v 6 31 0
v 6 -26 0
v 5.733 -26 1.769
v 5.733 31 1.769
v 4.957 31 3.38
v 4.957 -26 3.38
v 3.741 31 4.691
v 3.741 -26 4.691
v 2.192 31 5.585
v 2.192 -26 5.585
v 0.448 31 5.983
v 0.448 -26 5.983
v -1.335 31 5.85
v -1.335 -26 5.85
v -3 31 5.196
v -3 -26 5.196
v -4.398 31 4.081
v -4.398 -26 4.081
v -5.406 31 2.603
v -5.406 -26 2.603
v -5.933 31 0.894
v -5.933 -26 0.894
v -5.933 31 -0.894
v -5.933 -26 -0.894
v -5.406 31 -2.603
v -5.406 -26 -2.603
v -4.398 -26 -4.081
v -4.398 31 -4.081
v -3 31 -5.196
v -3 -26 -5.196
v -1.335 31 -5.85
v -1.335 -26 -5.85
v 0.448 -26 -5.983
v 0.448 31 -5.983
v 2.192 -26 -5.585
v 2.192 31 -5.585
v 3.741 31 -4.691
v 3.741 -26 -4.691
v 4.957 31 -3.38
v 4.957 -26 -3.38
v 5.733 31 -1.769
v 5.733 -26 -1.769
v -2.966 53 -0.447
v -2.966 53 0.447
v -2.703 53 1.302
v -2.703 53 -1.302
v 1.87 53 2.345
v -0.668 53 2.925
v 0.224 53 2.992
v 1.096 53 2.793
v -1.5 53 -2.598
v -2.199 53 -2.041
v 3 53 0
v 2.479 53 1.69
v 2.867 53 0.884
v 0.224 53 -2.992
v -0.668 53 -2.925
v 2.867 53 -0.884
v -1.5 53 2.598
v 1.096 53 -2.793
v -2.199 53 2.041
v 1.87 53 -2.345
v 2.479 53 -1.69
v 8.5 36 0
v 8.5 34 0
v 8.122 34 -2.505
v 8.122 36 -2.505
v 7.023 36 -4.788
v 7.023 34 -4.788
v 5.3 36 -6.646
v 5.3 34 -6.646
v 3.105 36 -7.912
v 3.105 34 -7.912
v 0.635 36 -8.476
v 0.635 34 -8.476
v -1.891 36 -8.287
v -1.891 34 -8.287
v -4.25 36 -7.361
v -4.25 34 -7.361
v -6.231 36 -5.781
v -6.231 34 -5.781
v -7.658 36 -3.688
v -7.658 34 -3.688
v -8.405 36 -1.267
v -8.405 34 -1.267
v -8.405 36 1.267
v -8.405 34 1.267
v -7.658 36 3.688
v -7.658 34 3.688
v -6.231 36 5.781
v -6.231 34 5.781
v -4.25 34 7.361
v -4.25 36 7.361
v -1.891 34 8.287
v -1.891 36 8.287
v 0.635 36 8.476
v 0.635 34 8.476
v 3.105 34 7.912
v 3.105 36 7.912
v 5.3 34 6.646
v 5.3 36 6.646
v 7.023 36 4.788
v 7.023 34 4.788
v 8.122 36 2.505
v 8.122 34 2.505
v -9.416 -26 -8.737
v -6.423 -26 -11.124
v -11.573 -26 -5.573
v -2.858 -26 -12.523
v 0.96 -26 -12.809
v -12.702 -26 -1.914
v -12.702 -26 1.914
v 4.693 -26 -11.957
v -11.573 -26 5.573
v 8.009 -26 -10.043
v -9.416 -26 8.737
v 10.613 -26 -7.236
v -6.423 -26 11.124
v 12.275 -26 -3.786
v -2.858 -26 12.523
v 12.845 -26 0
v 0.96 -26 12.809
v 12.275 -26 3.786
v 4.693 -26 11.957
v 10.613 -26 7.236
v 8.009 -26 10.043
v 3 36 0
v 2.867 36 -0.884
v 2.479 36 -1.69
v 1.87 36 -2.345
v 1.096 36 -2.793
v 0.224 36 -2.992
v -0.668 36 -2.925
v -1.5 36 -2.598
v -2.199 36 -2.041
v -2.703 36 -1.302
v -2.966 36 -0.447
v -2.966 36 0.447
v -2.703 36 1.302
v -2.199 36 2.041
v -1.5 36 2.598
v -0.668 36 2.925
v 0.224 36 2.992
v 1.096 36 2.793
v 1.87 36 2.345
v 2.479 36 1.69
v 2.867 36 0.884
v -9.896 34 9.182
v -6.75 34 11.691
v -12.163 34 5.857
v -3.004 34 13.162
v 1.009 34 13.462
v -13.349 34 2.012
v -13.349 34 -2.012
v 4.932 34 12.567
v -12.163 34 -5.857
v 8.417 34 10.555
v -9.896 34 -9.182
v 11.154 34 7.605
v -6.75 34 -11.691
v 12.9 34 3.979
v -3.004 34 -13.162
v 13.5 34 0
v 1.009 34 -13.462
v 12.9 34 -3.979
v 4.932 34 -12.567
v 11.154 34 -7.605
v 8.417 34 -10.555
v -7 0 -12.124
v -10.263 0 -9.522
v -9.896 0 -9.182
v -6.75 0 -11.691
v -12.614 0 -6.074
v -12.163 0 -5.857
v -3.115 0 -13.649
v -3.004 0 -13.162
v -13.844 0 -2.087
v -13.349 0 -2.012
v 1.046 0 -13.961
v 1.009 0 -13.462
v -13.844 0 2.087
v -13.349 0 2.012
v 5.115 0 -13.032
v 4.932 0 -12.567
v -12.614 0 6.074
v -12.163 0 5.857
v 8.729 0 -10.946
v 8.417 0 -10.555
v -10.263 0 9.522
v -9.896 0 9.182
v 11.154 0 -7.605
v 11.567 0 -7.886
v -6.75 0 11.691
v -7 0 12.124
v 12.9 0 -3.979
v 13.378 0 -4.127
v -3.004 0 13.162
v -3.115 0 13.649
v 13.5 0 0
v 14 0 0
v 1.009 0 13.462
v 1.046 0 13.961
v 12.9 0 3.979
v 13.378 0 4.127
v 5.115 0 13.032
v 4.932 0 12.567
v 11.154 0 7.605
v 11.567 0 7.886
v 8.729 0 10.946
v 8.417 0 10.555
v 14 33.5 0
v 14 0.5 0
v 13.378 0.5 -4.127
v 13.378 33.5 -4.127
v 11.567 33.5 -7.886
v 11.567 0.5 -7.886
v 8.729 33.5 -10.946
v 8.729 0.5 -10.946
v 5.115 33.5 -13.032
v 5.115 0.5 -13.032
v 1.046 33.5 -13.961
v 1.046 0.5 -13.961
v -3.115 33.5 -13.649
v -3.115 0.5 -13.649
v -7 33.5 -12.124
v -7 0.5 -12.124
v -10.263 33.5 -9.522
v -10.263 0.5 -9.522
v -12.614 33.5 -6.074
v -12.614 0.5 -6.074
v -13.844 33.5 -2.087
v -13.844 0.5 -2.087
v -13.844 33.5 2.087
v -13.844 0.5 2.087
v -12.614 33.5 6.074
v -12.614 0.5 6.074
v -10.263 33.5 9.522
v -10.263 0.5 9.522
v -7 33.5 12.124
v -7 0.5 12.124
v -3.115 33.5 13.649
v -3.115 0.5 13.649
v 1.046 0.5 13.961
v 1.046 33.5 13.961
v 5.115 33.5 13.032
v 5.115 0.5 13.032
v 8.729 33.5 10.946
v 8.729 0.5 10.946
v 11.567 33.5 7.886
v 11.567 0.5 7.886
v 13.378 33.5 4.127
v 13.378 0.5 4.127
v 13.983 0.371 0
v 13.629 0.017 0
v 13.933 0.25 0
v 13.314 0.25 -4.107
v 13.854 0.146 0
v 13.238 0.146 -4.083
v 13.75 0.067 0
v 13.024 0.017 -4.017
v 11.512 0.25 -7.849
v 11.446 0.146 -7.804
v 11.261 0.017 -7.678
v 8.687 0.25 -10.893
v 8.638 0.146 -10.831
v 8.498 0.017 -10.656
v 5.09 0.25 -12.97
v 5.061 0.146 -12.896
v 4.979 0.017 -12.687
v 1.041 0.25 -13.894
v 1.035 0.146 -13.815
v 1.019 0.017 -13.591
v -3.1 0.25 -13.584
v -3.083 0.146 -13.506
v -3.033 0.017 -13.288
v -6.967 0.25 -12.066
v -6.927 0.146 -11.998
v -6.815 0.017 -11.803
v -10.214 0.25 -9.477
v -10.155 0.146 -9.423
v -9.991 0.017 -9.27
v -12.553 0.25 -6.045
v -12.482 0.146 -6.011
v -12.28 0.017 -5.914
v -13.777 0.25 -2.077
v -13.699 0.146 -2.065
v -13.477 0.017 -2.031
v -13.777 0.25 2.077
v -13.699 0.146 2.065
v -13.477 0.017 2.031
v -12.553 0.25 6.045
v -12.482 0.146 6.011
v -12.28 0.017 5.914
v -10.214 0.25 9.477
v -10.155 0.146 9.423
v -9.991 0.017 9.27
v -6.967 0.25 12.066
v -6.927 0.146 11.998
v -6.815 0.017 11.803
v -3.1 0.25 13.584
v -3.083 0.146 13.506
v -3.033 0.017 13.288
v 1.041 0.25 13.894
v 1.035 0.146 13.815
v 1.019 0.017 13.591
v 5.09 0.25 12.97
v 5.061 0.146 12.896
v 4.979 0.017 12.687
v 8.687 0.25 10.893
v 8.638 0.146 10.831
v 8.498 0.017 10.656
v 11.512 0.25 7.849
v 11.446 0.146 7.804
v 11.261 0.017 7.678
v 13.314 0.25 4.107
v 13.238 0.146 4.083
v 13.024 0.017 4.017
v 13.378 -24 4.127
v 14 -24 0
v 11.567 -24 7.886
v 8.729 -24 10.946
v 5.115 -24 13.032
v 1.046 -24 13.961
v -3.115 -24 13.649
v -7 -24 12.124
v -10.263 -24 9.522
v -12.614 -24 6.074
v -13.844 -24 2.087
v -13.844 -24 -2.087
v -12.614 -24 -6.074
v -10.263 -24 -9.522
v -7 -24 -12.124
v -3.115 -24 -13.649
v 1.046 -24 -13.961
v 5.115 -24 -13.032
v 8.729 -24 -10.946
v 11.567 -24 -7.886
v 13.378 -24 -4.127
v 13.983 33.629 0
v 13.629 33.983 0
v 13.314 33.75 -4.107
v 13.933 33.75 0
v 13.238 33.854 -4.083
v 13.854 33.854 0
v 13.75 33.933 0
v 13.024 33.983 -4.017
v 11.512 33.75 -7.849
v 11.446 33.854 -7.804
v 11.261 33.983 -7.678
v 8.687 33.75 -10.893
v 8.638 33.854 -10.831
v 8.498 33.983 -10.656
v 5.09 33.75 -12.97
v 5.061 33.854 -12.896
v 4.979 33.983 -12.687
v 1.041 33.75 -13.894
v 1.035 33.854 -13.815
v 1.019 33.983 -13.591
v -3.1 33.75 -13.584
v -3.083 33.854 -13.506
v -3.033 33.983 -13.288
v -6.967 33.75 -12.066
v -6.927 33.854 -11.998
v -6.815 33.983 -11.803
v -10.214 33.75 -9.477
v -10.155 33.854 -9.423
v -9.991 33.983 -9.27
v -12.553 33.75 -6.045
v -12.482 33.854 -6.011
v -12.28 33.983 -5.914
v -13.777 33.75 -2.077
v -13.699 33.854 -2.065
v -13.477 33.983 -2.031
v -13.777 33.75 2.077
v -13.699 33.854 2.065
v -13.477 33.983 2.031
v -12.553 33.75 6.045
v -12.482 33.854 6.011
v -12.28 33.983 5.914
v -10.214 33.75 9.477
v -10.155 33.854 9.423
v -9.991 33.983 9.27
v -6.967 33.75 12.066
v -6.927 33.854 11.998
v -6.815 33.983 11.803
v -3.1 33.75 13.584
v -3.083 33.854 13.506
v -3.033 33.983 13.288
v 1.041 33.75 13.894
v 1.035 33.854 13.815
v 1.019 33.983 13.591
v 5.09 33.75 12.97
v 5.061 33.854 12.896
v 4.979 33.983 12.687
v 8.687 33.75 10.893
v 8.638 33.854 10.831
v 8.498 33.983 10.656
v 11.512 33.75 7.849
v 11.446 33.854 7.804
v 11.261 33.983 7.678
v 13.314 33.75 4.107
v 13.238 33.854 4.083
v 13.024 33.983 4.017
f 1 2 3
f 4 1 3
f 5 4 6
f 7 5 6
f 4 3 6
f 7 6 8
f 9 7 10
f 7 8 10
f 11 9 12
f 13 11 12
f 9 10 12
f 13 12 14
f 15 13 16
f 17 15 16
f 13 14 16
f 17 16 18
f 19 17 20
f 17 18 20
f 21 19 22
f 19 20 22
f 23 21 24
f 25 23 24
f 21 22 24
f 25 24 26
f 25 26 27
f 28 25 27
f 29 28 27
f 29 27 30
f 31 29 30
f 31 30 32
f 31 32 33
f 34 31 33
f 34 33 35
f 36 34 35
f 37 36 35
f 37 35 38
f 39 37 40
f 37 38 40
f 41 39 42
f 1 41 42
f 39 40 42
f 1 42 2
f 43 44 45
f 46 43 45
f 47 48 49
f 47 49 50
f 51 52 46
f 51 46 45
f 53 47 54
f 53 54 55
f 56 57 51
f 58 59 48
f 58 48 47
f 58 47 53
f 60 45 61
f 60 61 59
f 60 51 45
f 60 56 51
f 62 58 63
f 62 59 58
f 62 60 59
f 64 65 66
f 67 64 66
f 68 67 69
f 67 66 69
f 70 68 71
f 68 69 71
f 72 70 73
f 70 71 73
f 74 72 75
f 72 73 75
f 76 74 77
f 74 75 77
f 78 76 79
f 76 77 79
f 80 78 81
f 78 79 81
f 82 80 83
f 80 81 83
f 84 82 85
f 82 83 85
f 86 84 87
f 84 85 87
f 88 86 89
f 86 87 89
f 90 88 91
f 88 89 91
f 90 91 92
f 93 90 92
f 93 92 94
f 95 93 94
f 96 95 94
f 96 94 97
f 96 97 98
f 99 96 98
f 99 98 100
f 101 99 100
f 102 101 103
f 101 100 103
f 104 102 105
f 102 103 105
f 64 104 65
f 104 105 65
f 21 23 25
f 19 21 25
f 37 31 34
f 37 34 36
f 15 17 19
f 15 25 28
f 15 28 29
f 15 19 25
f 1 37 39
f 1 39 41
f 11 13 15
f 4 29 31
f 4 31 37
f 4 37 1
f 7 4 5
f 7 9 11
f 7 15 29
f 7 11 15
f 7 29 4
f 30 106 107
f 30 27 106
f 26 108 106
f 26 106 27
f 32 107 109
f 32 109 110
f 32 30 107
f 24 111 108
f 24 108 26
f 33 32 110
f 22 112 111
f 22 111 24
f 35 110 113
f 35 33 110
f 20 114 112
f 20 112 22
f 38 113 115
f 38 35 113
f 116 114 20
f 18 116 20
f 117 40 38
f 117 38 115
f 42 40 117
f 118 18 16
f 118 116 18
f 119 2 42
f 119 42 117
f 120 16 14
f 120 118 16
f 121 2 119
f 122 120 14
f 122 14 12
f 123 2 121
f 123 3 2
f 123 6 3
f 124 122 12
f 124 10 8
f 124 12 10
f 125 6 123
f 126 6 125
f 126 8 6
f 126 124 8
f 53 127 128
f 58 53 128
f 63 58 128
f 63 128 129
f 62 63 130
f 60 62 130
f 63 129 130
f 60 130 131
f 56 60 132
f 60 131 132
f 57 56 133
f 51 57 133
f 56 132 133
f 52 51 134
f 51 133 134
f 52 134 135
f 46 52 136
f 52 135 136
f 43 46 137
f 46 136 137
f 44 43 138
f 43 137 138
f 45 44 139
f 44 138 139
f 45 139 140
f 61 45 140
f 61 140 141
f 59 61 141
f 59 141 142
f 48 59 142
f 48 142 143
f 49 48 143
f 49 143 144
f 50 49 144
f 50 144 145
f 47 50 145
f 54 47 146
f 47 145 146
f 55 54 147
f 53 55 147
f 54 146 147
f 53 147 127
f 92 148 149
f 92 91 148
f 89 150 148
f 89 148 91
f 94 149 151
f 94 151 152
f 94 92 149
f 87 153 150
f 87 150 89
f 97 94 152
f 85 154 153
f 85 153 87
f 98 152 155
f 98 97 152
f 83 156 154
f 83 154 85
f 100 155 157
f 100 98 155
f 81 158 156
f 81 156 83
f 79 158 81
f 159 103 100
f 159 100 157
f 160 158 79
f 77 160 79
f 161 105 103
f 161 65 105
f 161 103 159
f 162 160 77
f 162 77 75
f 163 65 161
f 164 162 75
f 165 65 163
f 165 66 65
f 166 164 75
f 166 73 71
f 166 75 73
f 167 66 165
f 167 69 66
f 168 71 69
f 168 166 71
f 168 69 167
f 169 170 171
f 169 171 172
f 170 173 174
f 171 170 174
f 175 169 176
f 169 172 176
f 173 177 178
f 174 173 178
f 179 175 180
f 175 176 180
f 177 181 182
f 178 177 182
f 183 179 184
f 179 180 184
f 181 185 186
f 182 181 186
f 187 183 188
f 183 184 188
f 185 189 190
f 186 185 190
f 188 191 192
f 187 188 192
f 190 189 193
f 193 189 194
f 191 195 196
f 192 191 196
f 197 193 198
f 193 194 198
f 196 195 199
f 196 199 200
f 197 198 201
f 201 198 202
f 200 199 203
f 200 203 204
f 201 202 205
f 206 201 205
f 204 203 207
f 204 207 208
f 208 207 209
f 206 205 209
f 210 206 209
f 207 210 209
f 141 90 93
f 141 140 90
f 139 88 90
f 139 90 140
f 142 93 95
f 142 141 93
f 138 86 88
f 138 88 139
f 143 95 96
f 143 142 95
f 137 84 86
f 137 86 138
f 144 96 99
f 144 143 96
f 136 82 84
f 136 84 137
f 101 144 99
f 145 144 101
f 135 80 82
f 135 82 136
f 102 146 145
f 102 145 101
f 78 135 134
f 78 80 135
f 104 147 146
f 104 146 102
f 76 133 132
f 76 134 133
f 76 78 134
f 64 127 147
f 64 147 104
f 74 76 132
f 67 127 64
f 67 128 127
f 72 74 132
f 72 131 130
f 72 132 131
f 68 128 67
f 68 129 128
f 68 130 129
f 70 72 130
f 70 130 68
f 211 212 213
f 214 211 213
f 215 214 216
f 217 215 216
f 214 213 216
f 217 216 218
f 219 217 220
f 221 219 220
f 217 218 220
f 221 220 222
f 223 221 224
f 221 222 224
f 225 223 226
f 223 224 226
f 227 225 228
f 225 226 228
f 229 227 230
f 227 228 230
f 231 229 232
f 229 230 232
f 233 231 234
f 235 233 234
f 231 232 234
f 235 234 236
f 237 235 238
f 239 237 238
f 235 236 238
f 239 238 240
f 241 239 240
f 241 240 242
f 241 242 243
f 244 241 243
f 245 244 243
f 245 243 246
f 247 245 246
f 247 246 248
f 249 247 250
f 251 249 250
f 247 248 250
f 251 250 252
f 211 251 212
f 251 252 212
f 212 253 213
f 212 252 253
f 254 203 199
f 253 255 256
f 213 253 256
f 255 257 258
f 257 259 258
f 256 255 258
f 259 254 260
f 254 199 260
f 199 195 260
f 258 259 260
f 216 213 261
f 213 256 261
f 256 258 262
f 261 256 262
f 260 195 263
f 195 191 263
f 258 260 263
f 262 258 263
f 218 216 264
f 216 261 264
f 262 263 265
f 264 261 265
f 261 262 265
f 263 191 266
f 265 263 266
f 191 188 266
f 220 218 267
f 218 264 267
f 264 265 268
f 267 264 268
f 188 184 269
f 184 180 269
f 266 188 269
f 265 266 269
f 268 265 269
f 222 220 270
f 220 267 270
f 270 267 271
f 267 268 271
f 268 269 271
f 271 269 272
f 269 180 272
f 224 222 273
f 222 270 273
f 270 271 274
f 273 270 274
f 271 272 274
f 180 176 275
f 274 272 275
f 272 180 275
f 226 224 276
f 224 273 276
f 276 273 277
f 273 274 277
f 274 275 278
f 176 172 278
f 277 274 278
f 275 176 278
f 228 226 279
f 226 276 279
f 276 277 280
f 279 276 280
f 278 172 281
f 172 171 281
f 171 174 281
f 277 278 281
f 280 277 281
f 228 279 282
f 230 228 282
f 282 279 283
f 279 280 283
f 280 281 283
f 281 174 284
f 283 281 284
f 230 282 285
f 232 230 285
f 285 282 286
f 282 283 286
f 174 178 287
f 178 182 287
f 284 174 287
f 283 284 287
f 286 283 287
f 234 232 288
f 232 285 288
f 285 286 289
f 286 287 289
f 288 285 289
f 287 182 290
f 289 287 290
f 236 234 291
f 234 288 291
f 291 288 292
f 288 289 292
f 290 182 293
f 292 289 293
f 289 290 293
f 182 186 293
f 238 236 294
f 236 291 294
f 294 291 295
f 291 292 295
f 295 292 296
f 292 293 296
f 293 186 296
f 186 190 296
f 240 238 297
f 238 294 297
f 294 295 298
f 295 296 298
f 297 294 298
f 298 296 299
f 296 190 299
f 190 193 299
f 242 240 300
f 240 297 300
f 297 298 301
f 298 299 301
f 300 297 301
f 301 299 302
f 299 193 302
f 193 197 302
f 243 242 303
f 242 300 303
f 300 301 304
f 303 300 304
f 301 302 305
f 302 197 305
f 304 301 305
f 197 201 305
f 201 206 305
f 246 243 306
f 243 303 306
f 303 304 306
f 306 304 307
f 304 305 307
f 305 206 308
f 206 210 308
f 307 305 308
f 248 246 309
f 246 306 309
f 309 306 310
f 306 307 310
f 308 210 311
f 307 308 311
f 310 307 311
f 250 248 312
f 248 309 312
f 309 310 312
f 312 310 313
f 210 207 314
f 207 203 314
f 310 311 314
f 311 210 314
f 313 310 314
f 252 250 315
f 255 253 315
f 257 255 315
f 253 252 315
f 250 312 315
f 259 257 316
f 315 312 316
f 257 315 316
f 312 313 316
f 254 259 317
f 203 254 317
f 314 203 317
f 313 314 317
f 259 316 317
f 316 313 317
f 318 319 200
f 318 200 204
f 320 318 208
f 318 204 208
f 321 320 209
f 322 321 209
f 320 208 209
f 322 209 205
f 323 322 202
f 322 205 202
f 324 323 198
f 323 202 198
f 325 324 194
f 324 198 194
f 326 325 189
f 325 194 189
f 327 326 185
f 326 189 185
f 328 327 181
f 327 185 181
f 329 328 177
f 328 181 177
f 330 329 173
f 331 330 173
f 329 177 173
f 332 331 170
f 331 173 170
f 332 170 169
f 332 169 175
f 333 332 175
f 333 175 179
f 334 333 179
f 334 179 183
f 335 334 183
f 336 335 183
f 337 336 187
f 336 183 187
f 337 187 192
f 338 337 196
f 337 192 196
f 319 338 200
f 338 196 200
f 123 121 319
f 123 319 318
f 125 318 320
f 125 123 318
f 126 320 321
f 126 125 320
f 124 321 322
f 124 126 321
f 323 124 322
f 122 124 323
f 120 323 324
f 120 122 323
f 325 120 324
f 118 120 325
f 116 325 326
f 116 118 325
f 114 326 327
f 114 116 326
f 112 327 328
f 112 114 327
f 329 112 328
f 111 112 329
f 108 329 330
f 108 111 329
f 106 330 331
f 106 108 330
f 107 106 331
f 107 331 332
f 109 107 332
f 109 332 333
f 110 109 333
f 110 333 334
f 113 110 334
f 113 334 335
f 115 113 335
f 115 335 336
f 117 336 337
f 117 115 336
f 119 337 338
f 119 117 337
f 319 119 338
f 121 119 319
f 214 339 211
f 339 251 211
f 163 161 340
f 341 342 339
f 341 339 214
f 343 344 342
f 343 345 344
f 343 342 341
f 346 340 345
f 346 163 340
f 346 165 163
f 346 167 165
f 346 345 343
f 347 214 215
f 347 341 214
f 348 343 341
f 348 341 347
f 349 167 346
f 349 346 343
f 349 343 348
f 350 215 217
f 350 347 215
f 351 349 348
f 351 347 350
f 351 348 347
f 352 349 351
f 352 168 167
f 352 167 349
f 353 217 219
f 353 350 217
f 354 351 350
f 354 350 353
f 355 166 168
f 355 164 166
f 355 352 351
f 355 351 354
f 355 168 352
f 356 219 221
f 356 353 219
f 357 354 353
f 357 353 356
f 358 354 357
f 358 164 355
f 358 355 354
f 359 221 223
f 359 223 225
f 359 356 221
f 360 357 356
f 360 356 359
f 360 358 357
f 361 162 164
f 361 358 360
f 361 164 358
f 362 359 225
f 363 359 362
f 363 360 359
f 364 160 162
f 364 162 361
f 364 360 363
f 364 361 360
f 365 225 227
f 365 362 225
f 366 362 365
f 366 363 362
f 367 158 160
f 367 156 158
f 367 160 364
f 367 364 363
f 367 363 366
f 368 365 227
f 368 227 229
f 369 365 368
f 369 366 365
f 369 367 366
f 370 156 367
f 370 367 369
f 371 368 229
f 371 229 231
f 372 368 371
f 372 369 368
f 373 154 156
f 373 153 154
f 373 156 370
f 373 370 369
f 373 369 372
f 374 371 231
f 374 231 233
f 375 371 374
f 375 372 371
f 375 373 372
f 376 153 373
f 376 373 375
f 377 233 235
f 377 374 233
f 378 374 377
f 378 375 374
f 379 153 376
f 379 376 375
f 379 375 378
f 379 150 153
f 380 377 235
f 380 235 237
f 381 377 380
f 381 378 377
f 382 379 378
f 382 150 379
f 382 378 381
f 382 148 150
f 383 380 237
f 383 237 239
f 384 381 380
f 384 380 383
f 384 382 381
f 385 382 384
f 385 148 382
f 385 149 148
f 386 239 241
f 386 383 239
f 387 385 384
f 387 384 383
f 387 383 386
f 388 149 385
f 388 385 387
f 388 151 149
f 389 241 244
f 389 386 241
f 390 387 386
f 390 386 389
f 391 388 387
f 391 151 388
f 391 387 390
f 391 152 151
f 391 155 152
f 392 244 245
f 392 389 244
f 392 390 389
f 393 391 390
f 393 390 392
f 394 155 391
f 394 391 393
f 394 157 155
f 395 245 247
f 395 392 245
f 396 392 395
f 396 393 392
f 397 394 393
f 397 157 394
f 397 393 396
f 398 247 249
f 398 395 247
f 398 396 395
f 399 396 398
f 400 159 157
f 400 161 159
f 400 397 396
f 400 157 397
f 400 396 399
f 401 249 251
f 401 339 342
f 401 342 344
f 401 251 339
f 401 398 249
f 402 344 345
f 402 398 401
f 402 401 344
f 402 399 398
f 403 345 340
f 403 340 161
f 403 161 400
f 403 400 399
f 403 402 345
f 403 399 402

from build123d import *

# Parameters (mm, degrees)
SKETCH1_R           = 14
BOSS_EXTRUDE1_DEPTH = 34
SKETCH2_R           = 8.5
BOSS_EXTRUDE2_DEPTH = 2
SKETCH3_R           = 3
BOSS_EXTRUDE3_DEPTH = 17
FILLET1_R           = 0.5
SKETCH5_R           = 14
BOSS_EXTRUDE4_DEPTH = 26
CHAMFER1_SIZE       = 2
CHAMFER1_SIZE2      = 1.154700538
SKETCH6_R           = 6
CUT_EXTRUDE1_DEPTH  = 57


with BuildPart() as part:
    # Sketch1 → Boss-Extrude1 (new body)
    with BuildSketch(Plane(origin=(0, 0, 0), x_dir=(1, 0, 0), z_dir=(0, 1, 0))):
        Circle(SKETCH1_R)
    extrude(amount=BOSS_EXTRUDE1_DEPTH)

    # Sketch2 → Boss-Extrude2 (add)
    with BuildSketch(Plane(origin=(0, 34, 0), x_dir=(1, 0, 0), z_dir=(0, 1, 0))):
        Circle(SKETCH2_R)
    extrude(amount=BOSS_EXTRUDE2_DEPTH)

    # Sketch3 → Boss-Extrude3 (add)
    with BuildSketch(Plane(origin=(0, 36, 0), x_dir=(1, 0, 0), z_dir=(0, 1, 0))):
        Circle(SKETCH3_R)
    extrude(amount=BOSS_EXTRUDE3_DEPTH)

    # Fillet1
    fillet1_edges = [part.edges().sort_by_distance(p)[0] for p in [
        (-14, 0, 0),
        (-14, 34, 0),
    ]]
    fillet(fillet1_edges, radius=FILLET1_R)

    # Sketch5 → Boss-Extrude4 (add)
    with BuildSketch(Plane.XZ):
        Circle(SKETCH5_R)
    extrude(amount=BOSS_EXTRUDE4_DEPTH)

    # Chamfer1
    chamfer1_edges = [part.edges().sort_by_distance(p)[0] for p in [
        (-14, -26, 0),
    ]]
    chamfer1_side = [part.faces().sort_by_distance(p)[0] for p in [
        (-14, -13, 0),
    ]]
    chamfer(chamfer1_edges, length=CHAMFER1_SIZE, length2=CHAMFER1_SIZE2, reference=chamfer1_side[0])

    # Sketch6 → Cut-Extrude1 (cut)
    with BuildSketch(Plane.XZ.offset(26)):
        Circle(SKETCH6_R)
    extrude(amount=-CUT_EXTRUDE1_DEPTH, mode=Mode.SUBTRACT)


solid = part.part
